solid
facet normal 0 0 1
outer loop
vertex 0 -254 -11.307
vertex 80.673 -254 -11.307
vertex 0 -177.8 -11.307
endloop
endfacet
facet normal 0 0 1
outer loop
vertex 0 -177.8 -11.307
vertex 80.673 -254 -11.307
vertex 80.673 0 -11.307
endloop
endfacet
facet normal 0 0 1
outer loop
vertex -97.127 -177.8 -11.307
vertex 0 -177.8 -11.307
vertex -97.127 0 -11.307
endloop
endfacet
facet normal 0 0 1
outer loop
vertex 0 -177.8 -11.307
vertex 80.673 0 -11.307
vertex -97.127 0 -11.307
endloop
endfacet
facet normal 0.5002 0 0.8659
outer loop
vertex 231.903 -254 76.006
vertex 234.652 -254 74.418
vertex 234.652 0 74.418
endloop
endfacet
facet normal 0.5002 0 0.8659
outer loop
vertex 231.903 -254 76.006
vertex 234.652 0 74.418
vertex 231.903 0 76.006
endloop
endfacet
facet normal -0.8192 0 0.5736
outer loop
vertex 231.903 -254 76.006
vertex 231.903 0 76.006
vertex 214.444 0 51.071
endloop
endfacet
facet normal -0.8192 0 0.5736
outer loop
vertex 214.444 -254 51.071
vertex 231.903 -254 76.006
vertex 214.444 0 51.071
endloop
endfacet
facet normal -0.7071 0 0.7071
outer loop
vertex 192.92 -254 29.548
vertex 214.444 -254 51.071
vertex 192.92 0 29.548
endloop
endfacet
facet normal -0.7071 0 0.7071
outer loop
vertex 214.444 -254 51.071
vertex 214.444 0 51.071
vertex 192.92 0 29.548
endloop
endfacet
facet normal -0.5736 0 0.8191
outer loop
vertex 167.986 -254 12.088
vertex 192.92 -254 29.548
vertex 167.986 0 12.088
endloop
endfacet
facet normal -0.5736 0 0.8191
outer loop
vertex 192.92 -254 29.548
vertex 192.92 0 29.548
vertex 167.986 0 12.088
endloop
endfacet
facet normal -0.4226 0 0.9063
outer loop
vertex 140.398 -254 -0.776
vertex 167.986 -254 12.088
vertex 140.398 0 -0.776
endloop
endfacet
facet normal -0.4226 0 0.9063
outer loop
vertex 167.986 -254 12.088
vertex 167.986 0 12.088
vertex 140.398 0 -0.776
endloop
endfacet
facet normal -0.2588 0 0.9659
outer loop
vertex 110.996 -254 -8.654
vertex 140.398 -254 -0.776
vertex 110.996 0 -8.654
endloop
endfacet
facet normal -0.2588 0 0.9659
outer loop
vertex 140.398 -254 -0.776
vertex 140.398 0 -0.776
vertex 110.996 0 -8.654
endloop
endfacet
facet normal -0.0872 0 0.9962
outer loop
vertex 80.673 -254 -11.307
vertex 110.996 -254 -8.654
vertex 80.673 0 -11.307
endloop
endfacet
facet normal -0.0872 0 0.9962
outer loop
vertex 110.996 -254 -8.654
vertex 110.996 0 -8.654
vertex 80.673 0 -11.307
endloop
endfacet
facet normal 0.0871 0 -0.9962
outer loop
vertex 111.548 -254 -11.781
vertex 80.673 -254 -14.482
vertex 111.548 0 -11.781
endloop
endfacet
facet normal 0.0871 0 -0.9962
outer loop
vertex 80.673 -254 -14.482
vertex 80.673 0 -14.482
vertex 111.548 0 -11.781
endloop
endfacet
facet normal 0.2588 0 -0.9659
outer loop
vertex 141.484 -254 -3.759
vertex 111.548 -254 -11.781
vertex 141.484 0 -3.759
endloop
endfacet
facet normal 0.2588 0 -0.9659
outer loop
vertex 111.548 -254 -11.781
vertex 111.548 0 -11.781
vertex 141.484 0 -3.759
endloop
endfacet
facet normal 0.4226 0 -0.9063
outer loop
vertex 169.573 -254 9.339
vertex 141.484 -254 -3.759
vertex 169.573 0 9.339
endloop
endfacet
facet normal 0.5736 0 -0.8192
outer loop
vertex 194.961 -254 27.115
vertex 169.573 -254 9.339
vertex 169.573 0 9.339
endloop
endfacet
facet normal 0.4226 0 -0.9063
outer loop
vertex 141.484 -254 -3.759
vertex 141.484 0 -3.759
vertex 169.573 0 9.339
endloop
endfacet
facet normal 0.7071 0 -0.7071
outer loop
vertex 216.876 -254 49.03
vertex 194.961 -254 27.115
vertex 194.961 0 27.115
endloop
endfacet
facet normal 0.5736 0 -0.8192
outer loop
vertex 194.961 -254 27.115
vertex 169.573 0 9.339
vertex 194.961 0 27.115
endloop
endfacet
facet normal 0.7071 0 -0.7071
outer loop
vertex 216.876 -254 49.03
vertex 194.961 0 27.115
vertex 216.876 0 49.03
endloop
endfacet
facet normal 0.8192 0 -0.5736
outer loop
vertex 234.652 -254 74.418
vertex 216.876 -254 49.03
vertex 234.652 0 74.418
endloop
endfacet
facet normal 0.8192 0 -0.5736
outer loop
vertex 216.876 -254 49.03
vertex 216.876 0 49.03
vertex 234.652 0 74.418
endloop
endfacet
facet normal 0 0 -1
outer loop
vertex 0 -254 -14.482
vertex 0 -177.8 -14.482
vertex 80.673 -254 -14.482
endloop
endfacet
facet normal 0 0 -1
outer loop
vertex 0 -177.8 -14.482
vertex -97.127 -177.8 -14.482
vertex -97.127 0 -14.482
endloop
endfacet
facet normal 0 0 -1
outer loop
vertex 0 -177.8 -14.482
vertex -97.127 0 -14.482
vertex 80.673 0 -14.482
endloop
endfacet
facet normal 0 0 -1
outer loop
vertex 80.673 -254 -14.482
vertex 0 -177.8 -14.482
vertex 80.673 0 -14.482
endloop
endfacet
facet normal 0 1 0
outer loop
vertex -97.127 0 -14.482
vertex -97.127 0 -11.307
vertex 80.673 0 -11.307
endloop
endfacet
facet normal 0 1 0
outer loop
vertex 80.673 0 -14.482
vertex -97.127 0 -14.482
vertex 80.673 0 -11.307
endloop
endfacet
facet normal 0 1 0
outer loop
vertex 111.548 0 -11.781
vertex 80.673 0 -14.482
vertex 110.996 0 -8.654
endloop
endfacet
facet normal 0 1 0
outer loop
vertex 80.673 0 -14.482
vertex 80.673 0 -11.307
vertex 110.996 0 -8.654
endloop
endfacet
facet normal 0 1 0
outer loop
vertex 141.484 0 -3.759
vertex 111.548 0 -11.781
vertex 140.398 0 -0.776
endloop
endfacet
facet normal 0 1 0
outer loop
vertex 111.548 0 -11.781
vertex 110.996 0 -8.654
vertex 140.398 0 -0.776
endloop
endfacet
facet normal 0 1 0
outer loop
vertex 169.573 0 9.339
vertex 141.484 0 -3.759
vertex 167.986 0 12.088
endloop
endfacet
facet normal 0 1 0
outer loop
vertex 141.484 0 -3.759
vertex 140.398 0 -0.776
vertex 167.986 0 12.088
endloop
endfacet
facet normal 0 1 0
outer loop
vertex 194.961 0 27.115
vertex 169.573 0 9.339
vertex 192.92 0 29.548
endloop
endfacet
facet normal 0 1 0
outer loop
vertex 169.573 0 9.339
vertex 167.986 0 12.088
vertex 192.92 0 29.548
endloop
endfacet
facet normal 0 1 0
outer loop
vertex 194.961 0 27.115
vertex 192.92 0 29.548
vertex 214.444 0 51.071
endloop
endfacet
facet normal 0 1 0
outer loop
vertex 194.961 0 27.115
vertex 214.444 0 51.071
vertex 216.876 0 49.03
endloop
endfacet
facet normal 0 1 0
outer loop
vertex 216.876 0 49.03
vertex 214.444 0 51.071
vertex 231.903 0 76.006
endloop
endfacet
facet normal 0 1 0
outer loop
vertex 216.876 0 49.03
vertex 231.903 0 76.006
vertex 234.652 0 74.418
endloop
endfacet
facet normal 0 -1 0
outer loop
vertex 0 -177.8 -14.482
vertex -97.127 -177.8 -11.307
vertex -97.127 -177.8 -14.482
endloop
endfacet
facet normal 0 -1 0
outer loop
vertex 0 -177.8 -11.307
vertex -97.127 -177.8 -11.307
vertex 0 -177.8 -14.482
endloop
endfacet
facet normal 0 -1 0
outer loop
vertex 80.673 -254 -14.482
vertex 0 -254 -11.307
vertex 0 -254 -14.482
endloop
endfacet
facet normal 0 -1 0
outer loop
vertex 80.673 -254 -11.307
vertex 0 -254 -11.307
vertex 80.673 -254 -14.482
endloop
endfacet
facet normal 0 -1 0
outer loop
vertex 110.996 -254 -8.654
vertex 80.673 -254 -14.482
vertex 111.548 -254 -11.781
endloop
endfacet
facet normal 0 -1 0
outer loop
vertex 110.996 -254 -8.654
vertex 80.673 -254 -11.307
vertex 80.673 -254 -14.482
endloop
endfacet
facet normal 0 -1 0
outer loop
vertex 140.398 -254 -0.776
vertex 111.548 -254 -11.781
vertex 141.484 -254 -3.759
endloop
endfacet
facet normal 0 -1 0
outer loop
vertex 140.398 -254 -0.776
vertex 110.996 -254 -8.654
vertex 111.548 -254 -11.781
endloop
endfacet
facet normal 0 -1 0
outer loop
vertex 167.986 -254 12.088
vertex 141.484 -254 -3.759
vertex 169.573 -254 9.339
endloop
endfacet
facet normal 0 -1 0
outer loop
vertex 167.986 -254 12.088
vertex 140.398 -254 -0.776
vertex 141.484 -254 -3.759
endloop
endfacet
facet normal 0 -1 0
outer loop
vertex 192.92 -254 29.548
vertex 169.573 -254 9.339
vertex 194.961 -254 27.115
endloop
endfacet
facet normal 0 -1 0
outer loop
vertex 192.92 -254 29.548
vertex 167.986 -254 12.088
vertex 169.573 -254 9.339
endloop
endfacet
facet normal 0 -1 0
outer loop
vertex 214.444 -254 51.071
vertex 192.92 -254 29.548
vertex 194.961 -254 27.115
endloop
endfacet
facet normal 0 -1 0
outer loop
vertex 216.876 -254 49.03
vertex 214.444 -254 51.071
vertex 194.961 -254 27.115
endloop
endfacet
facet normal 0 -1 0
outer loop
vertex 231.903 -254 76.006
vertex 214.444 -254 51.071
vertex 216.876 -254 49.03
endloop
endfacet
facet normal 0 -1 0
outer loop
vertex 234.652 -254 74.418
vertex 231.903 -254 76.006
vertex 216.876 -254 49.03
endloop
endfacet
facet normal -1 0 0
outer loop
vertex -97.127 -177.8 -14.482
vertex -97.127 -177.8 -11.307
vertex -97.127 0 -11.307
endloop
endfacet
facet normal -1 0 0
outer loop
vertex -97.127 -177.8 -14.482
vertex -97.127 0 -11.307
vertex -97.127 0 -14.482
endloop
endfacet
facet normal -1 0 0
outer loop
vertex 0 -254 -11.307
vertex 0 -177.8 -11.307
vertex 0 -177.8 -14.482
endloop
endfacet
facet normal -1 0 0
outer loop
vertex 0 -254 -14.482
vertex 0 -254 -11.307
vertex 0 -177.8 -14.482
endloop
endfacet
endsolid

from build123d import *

# Parameters (mm, degrees)
F1_DEPTH = 177.8
F3_DEPTH = 76.2


with BuildPart() as f1:
    # F0 (on Front) → F1 (new body)
    with BuildSketch(Plane.XZ):
        with BuildLine():
            Line((-97.126943, -11.306872), (-97.126943, -14.481872))
            Line((-97.126943, -14.481872), (80.673057, -14.481872))
            ThreePointArc((80.673057, -14.481872), (169.573057, 9.338811), (234.652374, 74.418128))
            Line((234.652374, 74.418128), (231.902743, 76.005628))
            ThreePointArc((231.902743, 76.005628), (167.985557, 12.088441), (80.673057, -11.306872))
            Line((80.673057, -11.306872), (-97.126943, -11.306872))
        make_face()
    extrude(amount=F1_DEPTH)

    # F2 (on face) → F3 (join)
    with BuildSketch(Plane.XZ.offset(177.8)):
        with BuildLine():
            Line((80.673057, -11.306872), (0, -11.306872))
            Line((0, -11.306872), (0, -14.481872))
            Line((0, -14.481872), (25.070544, -14.481872))
            Line((25.070544, -14.481872), (80.673057, -14.481872))
            ThreePointArc((80.673057, -14.481872), (169.573057, 9.338811), (234.652374, 74.418128))
            Line((234.652374, 74.418128), (231.902743, 76.005628))
            ThreePointArc((231.902743, 76.005628), (167.985557, 12.088441), (80.673057, -11.306872))
        make_face()
    extrude(amount=F3_DEPTH)


solid = f1.part
